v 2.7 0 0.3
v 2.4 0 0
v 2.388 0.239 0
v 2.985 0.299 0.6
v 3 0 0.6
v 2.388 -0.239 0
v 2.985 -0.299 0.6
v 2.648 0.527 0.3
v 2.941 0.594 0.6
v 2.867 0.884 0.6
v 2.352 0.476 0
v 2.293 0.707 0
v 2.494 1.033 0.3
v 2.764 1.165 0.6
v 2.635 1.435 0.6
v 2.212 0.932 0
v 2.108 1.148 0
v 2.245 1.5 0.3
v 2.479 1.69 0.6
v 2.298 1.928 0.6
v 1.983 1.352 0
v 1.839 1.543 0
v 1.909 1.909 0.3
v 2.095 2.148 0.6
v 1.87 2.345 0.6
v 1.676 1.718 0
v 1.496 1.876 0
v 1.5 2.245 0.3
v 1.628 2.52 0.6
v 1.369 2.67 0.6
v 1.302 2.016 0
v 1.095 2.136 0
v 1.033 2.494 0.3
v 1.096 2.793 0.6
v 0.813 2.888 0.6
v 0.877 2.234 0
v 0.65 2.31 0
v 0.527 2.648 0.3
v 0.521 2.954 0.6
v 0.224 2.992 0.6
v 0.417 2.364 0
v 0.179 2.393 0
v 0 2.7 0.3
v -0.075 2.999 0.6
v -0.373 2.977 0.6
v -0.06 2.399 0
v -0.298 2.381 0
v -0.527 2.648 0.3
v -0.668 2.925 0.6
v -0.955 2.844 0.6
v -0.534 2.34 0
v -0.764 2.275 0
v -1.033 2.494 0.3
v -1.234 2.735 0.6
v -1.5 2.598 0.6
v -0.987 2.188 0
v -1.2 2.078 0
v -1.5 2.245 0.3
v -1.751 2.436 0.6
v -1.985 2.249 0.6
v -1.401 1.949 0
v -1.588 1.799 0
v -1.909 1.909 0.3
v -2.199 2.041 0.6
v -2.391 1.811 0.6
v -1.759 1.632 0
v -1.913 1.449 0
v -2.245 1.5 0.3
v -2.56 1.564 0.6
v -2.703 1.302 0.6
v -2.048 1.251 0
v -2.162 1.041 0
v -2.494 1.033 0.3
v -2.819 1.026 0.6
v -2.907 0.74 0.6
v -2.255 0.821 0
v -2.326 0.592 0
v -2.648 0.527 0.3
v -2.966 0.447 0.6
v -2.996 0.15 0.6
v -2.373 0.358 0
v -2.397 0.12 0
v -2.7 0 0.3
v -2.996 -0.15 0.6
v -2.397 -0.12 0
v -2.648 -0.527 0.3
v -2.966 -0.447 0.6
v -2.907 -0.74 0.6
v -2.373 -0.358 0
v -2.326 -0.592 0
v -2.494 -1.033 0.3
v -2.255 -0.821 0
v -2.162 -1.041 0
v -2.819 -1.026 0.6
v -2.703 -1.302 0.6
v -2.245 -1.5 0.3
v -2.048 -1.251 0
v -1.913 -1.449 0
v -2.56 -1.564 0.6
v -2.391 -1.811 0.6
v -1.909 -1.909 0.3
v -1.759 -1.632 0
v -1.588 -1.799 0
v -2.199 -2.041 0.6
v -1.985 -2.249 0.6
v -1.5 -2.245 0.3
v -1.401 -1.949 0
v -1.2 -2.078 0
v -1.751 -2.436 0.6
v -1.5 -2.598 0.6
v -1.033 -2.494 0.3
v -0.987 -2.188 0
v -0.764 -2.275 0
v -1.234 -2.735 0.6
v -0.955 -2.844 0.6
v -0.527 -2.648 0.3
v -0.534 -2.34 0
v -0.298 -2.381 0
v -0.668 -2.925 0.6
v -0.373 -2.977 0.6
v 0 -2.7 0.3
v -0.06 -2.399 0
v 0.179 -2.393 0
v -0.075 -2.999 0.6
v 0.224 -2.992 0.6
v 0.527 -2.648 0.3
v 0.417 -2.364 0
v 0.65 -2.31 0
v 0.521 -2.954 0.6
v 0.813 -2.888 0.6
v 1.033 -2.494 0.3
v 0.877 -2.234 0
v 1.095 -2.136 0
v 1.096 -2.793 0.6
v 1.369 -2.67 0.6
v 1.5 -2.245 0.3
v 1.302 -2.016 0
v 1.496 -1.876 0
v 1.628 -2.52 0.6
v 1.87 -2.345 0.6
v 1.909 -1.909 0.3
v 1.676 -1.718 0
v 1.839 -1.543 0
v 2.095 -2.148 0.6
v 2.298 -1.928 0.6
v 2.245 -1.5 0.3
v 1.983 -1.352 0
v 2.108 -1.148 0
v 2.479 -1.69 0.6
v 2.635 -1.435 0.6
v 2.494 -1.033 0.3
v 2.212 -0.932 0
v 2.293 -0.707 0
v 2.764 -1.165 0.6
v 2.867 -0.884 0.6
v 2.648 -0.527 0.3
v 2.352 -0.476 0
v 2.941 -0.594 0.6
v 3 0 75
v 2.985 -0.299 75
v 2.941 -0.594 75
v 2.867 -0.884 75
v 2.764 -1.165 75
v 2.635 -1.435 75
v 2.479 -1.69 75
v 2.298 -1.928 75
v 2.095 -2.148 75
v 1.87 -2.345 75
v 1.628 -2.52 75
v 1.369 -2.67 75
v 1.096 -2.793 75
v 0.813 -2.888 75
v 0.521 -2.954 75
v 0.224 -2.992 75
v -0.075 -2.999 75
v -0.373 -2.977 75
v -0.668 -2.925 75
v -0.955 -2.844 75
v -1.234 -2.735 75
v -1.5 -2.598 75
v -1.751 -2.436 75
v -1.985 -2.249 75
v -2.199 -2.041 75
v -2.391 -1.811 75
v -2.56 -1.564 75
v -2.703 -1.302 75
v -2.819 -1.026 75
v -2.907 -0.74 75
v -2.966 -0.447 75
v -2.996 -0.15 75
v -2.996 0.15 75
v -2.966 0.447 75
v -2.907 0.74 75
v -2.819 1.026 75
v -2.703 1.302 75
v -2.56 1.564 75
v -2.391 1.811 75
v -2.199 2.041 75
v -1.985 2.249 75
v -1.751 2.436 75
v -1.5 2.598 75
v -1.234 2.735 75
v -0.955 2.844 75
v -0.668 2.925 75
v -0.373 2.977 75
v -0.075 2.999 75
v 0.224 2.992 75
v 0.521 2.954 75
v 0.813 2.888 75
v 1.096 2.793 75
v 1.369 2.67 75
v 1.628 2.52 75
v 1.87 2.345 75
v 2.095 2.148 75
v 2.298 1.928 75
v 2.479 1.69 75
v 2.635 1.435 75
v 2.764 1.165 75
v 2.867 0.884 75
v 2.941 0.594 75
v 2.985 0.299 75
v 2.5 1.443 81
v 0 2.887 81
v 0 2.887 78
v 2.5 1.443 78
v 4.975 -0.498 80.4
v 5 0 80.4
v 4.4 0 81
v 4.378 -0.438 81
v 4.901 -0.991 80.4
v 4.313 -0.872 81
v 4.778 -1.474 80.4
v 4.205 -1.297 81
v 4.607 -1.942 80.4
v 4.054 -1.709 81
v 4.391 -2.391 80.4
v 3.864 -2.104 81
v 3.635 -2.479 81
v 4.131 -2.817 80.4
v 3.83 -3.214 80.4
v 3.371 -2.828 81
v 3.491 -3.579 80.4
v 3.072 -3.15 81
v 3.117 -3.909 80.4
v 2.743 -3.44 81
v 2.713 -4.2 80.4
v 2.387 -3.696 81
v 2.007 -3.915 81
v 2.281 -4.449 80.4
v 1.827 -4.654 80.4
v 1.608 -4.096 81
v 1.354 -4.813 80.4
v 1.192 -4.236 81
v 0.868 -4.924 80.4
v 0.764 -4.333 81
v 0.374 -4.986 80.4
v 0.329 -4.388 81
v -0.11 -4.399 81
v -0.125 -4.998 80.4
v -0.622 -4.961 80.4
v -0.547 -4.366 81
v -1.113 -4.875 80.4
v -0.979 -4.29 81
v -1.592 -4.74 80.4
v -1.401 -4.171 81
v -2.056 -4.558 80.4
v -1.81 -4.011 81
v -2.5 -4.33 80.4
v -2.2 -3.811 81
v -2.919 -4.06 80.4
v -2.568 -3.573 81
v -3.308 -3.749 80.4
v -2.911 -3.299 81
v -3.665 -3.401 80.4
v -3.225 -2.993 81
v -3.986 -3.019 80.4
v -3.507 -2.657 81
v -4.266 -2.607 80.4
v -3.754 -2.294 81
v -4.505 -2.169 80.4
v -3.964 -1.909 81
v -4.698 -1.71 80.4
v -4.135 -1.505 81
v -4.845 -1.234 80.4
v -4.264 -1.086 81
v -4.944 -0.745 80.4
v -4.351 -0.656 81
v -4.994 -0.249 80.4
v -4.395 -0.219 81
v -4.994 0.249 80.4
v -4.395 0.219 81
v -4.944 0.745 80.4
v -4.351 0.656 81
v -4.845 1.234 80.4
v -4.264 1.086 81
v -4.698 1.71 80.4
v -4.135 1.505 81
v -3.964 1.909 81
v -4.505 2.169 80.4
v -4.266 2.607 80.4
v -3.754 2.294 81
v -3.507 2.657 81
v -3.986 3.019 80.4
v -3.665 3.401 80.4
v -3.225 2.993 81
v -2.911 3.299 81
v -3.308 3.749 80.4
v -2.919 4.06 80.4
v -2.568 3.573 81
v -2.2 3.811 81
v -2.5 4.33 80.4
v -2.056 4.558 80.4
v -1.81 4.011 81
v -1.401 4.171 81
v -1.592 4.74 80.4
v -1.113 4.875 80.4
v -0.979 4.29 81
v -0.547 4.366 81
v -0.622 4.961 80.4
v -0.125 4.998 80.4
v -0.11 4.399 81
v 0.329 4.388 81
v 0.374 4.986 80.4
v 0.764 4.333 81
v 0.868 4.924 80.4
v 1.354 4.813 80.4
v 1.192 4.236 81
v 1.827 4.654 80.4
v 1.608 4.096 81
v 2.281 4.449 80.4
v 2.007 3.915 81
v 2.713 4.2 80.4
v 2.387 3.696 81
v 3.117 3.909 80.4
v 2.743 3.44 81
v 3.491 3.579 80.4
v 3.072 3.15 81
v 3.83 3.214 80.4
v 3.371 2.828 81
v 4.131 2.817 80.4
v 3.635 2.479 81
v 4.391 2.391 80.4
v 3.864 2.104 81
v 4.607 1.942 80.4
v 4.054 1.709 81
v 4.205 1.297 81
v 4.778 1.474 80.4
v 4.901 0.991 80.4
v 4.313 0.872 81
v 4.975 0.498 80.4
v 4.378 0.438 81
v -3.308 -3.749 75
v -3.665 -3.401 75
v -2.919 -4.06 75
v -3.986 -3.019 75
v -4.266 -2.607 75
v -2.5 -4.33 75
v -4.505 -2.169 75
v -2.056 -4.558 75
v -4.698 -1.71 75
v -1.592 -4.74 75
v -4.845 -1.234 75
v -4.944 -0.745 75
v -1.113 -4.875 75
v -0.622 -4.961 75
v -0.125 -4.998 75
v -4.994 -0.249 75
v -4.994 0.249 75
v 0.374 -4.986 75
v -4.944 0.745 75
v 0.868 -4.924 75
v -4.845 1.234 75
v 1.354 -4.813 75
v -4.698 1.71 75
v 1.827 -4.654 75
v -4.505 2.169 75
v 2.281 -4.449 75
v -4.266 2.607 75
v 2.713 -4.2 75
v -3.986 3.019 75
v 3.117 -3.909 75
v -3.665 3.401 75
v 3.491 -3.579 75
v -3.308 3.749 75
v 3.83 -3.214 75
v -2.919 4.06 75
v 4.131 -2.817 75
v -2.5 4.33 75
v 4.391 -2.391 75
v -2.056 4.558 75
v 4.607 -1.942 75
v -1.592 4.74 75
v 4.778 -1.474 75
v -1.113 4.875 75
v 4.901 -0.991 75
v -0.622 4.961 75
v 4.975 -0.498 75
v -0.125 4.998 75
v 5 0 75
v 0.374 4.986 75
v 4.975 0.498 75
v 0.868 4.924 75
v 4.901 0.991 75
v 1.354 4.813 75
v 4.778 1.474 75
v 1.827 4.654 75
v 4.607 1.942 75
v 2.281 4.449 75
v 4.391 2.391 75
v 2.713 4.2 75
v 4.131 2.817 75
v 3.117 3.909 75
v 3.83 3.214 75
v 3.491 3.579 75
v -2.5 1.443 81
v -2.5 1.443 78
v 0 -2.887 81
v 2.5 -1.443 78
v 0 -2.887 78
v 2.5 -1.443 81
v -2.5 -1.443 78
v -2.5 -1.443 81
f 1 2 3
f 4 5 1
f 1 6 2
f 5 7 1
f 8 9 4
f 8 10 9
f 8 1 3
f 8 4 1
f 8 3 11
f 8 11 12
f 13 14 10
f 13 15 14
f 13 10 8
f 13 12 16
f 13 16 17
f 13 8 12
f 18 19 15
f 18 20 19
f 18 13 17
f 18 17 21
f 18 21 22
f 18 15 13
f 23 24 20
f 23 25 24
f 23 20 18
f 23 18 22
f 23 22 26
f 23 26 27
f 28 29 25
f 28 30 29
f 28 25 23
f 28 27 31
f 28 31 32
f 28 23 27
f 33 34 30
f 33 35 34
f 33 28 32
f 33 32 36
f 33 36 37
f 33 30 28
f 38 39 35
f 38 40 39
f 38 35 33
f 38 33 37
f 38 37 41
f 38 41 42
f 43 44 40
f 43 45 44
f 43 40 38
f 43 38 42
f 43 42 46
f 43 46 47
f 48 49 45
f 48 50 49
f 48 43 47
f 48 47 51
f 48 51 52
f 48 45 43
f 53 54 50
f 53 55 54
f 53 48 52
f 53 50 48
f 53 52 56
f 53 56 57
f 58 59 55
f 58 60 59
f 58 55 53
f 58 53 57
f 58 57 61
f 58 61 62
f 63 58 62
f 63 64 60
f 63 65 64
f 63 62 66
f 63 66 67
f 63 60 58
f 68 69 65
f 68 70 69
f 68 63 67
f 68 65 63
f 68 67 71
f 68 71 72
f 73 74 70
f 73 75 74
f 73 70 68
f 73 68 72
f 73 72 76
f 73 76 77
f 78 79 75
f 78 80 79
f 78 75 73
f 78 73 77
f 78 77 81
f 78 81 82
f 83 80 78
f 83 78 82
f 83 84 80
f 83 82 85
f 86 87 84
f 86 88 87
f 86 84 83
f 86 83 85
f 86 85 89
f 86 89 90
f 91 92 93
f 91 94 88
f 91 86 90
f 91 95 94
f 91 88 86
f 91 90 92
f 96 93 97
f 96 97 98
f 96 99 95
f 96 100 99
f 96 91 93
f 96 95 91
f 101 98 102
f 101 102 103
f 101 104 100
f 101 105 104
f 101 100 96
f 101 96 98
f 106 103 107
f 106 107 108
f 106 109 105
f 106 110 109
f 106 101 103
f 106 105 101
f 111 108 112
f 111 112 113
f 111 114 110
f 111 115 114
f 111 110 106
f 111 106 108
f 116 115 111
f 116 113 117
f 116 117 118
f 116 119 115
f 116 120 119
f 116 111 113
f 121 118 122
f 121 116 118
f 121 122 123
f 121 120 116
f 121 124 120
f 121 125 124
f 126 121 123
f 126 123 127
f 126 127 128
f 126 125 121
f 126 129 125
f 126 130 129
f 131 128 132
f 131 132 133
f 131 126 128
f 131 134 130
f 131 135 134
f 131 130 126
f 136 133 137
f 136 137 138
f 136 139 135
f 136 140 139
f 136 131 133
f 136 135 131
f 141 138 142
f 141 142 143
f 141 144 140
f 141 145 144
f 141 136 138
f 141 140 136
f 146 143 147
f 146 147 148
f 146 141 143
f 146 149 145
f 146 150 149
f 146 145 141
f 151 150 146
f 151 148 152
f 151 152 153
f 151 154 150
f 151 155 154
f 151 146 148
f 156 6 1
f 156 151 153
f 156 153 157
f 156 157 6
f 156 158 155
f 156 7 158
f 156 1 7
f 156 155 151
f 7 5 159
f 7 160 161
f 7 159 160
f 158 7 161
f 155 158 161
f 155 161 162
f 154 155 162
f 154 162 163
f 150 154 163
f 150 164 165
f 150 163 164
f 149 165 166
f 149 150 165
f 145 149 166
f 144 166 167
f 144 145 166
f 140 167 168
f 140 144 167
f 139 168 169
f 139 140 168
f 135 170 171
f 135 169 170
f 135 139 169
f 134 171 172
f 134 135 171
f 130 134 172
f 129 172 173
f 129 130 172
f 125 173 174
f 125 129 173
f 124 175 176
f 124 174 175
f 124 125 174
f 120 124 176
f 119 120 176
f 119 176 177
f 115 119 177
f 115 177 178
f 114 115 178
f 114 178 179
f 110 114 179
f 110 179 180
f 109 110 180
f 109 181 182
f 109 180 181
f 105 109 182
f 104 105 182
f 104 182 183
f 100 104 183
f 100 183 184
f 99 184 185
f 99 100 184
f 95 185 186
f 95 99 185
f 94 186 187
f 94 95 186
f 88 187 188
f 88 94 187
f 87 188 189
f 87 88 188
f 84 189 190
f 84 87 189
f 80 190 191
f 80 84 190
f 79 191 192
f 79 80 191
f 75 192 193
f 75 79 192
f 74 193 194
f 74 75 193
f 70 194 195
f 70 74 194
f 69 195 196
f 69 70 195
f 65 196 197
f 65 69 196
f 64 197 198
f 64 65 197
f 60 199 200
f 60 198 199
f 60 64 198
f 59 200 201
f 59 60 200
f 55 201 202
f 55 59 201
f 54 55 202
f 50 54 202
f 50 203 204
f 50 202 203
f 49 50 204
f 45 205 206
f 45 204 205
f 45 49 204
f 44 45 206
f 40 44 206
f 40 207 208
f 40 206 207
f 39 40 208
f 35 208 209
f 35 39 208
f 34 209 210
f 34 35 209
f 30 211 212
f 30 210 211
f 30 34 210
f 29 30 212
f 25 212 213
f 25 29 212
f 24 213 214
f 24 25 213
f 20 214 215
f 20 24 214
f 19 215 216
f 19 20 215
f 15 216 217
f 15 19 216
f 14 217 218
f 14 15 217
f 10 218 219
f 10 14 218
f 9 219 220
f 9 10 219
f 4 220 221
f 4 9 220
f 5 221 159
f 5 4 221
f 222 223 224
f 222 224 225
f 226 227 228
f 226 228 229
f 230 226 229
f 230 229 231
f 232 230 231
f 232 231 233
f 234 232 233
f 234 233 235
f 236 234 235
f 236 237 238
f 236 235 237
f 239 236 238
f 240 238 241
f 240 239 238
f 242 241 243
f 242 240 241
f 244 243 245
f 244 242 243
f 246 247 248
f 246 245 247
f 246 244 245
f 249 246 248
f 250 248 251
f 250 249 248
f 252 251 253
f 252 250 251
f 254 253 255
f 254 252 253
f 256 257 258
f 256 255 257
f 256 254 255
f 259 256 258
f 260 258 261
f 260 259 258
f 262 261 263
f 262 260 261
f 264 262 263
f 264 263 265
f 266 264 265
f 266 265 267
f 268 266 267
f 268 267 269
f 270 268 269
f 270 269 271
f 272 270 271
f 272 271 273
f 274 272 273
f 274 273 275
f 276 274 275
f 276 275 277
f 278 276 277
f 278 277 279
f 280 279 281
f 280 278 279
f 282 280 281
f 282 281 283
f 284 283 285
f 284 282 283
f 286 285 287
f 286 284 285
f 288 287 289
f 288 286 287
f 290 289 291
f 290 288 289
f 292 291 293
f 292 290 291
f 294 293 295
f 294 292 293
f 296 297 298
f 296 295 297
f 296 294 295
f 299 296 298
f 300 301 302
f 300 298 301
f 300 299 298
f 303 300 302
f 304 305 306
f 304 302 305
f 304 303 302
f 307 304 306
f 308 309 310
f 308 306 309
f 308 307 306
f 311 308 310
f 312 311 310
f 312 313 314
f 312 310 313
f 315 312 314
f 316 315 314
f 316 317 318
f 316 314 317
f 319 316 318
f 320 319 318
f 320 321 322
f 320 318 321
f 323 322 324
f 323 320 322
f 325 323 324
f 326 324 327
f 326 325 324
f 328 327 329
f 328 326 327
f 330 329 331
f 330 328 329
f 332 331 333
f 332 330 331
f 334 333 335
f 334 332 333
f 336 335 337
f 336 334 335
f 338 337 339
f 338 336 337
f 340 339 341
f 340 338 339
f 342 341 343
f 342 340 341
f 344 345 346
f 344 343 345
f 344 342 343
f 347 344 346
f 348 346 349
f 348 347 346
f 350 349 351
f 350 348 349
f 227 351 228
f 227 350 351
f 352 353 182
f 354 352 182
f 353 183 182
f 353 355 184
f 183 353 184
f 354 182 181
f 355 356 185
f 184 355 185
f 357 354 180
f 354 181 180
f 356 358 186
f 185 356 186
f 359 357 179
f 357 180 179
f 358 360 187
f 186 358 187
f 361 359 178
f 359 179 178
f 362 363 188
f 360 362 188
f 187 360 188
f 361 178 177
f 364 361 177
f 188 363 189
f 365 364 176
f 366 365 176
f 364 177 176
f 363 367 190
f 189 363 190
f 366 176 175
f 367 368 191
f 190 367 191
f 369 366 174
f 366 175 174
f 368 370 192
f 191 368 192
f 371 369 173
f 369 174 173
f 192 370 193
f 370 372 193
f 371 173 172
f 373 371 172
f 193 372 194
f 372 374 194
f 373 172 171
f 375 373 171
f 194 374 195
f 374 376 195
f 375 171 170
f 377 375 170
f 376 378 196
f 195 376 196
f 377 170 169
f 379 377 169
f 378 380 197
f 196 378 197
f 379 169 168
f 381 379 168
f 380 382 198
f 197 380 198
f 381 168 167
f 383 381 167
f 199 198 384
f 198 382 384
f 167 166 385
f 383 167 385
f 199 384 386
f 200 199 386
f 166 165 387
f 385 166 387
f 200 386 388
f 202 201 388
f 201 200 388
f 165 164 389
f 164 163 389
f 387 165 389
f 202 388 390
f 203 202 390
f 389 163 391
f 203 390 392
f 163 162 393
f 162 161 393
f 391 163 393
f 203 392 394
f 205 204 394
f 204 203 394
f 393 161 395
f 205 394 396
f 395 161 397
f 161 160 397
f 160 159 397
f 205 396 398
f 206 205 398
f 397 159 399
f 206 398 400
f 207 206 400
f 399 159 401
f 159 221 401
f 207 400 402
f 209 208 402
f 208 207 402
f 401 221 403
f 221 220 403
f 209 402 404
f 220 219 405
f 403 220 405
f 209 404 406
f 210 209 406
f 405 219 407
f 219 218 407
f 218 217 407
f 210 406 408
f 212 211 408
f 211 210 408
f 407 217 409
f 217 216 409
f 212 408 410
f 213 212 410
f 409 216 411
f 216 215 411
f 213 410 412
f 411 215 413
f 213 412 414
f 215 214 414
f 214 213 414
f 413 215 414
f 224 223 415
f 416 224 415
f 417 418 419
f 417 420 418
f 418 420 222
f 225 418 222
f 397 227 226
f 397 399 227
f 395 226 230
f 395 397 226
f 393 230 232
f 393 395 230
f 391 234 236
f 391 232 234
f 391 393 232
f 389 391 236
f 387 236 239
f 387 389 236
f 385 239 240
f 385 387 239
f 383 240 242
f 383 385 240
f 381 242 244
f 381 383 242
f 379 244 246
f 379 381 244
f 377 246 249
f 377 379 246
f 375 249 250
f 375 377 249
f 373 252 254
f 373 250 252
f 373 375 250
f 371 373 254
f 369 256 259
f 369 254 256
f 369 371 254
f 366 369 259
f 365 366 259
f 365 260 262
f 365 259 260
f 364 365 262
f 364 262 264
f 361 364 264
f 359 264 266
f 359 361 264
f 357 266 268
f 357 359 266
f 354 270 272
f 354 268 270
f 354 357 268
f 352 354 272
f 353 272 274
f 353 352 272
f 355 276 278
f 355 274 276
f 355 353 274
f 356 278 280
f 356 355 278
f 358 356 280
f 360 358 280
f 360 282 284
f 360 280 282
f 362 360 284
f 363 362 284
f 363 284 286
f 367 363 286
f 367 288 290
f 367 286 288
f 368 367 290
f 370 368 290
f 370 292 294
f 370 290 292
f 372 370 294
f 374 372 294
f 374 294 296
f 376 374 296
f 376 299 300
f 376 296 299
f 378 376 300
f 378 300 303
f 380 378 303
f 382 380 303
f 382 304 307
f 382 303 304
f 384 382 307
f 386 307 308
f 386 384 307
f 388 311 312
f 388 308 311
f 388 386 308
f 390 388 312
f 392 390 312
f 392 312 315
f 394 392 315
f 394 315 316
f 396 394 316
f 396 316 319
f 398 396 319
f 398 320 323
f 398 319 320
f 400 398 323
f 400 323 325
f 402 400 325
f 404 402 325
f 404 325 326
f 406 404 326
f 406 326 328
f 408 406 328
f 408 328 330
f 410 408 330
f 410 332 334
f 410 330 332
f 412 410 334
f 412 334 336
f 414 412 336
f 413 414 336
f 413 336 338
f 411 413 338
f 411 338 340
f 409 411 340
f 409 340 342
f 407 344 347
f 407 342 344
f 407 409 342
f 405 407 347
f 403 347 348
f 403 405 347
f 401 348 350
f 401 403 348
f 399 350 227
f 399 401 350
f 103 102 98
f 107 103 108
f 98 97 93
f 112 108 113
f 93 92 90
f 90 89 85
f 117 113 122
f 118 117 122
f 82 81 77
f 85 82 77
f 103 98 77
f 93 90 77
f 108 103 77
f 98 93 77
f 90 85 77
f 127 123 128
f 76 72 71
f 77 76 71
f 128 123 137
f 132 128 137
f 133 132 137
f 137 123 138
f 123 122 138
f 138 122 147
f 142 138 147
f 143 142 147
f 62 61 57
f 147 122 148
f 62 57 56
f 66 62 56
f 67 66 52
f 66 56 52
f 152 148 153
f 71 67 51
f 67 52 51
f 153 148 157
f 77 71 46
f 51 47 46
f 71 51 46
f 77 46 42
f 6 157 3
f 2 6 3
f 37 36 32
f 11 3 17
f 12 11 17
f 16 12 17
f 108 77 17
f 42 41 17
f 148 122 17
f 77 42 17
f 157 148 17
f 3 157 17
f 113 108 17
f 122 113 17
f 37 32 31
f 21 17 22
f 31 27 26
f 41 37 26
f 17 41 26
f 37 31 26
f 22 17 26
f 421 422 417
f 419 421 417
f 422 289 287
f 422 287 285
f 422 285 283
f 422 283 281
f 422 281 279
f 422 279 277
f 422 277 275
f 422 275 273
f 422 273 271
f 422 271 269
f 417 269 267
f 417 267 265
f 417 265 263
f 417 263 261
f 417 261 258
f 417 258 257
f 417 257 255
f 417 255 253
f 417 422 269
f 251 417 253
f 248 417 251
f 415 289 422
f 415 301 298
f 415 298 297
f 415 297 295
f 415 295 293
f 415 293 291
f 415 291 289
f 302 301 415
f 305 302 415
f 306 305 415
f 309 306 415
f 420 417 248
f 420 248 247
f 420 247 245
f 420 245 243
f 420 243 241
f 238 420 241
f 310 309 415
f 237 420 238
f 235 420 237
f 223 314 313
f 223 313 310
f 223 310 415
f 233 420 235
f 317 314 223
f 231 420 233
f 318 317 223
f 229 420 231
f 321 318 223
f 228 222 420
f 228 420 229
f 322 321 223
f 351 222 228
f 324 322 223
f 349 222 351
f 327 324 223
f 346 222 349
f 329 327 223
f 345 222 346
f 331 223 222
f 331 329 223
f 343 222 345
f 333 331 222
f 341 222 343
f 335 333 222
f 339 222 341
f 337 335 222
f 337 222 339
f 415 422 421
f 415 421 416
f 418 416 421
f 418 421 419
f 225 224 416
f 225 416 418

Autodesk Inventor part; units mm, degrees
ref_plane "YZ Plane" through (0, 0, 0) normal (1, 0, 0) x (0, 1, 0)
ref_plane "XZ Plane" through (0, 0, 0) normal (0, 1, 0) x (-1, 0, 0)
ref_plane "XY Plane" through (0, 0, 0) normal (0, 0, 1) x (1, 0, 0)
sketch "Sketch1" plane through (0, 0, 0) normal (0, 0, 1) x (1, 0, 0)
  circle A0 centre (0, 0) radius 3
  dimension "Diameter" = 6
extrude "Extrusion1" add sketch "Sketch1" along normal blind 75
sketch "Sketch2" plane through (0, 0, 75) normal (0, 0, 1) x (1, 0, 0)
  circle A0 centre (0, 0) radius 3 projected
  circle A1 centre (0, 0) radius 5
  dimension "Head_Diameter" = 10
extrude "Extrusion2" add sketch "Sketch2" along normal blind 6 contours A0 | A1
sketch "Sketch3" plane through (0, 0, 81) normal (0, 0, 1) x (1, 0, 0)
  circle A0 centre (0, 0) radius 5 projected
  circle A1 centre (0, 0) radius 2.8868 construction
  line L0 (0, 2.8868) -> (2.5, 1.4434)
  line L1 (2.5, -1.4434) -> (2.5, 1.4434)
  line L2 (0, 2.8868) -> (-2.5, 1.4434)
  line L3 (-2.5, -1.4434) -> (-2.5, 1.4434)
  line L4 (-2.5, -1.4434) -> (0, -2.8868)
  line L5 (2.5, -1.4434) -> (0, -2.8868)
  dimension "Hex_Width" = 5
extrude "Extrusion3" cut sketch "Sketch3" against normal blind 3 contours L0 L1 L5 L4 L3 L2
thread "Thread1" size "M6x1" class "4g6g" standard "ANSI Metric M Profile" length 24
chamfer "Chamfer1" distance 0.6 angle 45 2 edges at (-5, 0, 81) (-3, 0, 0)
equation "\"d9\" = ThreadLength"
equation "\"d12\" = Chamfer"
equation "\"ThreadLength\" = 24"
equation "\"Chamfer\" = 0.6"
properties part number "SCREW, SOCKET HD, P, 12.9, M6X1X75MM"
